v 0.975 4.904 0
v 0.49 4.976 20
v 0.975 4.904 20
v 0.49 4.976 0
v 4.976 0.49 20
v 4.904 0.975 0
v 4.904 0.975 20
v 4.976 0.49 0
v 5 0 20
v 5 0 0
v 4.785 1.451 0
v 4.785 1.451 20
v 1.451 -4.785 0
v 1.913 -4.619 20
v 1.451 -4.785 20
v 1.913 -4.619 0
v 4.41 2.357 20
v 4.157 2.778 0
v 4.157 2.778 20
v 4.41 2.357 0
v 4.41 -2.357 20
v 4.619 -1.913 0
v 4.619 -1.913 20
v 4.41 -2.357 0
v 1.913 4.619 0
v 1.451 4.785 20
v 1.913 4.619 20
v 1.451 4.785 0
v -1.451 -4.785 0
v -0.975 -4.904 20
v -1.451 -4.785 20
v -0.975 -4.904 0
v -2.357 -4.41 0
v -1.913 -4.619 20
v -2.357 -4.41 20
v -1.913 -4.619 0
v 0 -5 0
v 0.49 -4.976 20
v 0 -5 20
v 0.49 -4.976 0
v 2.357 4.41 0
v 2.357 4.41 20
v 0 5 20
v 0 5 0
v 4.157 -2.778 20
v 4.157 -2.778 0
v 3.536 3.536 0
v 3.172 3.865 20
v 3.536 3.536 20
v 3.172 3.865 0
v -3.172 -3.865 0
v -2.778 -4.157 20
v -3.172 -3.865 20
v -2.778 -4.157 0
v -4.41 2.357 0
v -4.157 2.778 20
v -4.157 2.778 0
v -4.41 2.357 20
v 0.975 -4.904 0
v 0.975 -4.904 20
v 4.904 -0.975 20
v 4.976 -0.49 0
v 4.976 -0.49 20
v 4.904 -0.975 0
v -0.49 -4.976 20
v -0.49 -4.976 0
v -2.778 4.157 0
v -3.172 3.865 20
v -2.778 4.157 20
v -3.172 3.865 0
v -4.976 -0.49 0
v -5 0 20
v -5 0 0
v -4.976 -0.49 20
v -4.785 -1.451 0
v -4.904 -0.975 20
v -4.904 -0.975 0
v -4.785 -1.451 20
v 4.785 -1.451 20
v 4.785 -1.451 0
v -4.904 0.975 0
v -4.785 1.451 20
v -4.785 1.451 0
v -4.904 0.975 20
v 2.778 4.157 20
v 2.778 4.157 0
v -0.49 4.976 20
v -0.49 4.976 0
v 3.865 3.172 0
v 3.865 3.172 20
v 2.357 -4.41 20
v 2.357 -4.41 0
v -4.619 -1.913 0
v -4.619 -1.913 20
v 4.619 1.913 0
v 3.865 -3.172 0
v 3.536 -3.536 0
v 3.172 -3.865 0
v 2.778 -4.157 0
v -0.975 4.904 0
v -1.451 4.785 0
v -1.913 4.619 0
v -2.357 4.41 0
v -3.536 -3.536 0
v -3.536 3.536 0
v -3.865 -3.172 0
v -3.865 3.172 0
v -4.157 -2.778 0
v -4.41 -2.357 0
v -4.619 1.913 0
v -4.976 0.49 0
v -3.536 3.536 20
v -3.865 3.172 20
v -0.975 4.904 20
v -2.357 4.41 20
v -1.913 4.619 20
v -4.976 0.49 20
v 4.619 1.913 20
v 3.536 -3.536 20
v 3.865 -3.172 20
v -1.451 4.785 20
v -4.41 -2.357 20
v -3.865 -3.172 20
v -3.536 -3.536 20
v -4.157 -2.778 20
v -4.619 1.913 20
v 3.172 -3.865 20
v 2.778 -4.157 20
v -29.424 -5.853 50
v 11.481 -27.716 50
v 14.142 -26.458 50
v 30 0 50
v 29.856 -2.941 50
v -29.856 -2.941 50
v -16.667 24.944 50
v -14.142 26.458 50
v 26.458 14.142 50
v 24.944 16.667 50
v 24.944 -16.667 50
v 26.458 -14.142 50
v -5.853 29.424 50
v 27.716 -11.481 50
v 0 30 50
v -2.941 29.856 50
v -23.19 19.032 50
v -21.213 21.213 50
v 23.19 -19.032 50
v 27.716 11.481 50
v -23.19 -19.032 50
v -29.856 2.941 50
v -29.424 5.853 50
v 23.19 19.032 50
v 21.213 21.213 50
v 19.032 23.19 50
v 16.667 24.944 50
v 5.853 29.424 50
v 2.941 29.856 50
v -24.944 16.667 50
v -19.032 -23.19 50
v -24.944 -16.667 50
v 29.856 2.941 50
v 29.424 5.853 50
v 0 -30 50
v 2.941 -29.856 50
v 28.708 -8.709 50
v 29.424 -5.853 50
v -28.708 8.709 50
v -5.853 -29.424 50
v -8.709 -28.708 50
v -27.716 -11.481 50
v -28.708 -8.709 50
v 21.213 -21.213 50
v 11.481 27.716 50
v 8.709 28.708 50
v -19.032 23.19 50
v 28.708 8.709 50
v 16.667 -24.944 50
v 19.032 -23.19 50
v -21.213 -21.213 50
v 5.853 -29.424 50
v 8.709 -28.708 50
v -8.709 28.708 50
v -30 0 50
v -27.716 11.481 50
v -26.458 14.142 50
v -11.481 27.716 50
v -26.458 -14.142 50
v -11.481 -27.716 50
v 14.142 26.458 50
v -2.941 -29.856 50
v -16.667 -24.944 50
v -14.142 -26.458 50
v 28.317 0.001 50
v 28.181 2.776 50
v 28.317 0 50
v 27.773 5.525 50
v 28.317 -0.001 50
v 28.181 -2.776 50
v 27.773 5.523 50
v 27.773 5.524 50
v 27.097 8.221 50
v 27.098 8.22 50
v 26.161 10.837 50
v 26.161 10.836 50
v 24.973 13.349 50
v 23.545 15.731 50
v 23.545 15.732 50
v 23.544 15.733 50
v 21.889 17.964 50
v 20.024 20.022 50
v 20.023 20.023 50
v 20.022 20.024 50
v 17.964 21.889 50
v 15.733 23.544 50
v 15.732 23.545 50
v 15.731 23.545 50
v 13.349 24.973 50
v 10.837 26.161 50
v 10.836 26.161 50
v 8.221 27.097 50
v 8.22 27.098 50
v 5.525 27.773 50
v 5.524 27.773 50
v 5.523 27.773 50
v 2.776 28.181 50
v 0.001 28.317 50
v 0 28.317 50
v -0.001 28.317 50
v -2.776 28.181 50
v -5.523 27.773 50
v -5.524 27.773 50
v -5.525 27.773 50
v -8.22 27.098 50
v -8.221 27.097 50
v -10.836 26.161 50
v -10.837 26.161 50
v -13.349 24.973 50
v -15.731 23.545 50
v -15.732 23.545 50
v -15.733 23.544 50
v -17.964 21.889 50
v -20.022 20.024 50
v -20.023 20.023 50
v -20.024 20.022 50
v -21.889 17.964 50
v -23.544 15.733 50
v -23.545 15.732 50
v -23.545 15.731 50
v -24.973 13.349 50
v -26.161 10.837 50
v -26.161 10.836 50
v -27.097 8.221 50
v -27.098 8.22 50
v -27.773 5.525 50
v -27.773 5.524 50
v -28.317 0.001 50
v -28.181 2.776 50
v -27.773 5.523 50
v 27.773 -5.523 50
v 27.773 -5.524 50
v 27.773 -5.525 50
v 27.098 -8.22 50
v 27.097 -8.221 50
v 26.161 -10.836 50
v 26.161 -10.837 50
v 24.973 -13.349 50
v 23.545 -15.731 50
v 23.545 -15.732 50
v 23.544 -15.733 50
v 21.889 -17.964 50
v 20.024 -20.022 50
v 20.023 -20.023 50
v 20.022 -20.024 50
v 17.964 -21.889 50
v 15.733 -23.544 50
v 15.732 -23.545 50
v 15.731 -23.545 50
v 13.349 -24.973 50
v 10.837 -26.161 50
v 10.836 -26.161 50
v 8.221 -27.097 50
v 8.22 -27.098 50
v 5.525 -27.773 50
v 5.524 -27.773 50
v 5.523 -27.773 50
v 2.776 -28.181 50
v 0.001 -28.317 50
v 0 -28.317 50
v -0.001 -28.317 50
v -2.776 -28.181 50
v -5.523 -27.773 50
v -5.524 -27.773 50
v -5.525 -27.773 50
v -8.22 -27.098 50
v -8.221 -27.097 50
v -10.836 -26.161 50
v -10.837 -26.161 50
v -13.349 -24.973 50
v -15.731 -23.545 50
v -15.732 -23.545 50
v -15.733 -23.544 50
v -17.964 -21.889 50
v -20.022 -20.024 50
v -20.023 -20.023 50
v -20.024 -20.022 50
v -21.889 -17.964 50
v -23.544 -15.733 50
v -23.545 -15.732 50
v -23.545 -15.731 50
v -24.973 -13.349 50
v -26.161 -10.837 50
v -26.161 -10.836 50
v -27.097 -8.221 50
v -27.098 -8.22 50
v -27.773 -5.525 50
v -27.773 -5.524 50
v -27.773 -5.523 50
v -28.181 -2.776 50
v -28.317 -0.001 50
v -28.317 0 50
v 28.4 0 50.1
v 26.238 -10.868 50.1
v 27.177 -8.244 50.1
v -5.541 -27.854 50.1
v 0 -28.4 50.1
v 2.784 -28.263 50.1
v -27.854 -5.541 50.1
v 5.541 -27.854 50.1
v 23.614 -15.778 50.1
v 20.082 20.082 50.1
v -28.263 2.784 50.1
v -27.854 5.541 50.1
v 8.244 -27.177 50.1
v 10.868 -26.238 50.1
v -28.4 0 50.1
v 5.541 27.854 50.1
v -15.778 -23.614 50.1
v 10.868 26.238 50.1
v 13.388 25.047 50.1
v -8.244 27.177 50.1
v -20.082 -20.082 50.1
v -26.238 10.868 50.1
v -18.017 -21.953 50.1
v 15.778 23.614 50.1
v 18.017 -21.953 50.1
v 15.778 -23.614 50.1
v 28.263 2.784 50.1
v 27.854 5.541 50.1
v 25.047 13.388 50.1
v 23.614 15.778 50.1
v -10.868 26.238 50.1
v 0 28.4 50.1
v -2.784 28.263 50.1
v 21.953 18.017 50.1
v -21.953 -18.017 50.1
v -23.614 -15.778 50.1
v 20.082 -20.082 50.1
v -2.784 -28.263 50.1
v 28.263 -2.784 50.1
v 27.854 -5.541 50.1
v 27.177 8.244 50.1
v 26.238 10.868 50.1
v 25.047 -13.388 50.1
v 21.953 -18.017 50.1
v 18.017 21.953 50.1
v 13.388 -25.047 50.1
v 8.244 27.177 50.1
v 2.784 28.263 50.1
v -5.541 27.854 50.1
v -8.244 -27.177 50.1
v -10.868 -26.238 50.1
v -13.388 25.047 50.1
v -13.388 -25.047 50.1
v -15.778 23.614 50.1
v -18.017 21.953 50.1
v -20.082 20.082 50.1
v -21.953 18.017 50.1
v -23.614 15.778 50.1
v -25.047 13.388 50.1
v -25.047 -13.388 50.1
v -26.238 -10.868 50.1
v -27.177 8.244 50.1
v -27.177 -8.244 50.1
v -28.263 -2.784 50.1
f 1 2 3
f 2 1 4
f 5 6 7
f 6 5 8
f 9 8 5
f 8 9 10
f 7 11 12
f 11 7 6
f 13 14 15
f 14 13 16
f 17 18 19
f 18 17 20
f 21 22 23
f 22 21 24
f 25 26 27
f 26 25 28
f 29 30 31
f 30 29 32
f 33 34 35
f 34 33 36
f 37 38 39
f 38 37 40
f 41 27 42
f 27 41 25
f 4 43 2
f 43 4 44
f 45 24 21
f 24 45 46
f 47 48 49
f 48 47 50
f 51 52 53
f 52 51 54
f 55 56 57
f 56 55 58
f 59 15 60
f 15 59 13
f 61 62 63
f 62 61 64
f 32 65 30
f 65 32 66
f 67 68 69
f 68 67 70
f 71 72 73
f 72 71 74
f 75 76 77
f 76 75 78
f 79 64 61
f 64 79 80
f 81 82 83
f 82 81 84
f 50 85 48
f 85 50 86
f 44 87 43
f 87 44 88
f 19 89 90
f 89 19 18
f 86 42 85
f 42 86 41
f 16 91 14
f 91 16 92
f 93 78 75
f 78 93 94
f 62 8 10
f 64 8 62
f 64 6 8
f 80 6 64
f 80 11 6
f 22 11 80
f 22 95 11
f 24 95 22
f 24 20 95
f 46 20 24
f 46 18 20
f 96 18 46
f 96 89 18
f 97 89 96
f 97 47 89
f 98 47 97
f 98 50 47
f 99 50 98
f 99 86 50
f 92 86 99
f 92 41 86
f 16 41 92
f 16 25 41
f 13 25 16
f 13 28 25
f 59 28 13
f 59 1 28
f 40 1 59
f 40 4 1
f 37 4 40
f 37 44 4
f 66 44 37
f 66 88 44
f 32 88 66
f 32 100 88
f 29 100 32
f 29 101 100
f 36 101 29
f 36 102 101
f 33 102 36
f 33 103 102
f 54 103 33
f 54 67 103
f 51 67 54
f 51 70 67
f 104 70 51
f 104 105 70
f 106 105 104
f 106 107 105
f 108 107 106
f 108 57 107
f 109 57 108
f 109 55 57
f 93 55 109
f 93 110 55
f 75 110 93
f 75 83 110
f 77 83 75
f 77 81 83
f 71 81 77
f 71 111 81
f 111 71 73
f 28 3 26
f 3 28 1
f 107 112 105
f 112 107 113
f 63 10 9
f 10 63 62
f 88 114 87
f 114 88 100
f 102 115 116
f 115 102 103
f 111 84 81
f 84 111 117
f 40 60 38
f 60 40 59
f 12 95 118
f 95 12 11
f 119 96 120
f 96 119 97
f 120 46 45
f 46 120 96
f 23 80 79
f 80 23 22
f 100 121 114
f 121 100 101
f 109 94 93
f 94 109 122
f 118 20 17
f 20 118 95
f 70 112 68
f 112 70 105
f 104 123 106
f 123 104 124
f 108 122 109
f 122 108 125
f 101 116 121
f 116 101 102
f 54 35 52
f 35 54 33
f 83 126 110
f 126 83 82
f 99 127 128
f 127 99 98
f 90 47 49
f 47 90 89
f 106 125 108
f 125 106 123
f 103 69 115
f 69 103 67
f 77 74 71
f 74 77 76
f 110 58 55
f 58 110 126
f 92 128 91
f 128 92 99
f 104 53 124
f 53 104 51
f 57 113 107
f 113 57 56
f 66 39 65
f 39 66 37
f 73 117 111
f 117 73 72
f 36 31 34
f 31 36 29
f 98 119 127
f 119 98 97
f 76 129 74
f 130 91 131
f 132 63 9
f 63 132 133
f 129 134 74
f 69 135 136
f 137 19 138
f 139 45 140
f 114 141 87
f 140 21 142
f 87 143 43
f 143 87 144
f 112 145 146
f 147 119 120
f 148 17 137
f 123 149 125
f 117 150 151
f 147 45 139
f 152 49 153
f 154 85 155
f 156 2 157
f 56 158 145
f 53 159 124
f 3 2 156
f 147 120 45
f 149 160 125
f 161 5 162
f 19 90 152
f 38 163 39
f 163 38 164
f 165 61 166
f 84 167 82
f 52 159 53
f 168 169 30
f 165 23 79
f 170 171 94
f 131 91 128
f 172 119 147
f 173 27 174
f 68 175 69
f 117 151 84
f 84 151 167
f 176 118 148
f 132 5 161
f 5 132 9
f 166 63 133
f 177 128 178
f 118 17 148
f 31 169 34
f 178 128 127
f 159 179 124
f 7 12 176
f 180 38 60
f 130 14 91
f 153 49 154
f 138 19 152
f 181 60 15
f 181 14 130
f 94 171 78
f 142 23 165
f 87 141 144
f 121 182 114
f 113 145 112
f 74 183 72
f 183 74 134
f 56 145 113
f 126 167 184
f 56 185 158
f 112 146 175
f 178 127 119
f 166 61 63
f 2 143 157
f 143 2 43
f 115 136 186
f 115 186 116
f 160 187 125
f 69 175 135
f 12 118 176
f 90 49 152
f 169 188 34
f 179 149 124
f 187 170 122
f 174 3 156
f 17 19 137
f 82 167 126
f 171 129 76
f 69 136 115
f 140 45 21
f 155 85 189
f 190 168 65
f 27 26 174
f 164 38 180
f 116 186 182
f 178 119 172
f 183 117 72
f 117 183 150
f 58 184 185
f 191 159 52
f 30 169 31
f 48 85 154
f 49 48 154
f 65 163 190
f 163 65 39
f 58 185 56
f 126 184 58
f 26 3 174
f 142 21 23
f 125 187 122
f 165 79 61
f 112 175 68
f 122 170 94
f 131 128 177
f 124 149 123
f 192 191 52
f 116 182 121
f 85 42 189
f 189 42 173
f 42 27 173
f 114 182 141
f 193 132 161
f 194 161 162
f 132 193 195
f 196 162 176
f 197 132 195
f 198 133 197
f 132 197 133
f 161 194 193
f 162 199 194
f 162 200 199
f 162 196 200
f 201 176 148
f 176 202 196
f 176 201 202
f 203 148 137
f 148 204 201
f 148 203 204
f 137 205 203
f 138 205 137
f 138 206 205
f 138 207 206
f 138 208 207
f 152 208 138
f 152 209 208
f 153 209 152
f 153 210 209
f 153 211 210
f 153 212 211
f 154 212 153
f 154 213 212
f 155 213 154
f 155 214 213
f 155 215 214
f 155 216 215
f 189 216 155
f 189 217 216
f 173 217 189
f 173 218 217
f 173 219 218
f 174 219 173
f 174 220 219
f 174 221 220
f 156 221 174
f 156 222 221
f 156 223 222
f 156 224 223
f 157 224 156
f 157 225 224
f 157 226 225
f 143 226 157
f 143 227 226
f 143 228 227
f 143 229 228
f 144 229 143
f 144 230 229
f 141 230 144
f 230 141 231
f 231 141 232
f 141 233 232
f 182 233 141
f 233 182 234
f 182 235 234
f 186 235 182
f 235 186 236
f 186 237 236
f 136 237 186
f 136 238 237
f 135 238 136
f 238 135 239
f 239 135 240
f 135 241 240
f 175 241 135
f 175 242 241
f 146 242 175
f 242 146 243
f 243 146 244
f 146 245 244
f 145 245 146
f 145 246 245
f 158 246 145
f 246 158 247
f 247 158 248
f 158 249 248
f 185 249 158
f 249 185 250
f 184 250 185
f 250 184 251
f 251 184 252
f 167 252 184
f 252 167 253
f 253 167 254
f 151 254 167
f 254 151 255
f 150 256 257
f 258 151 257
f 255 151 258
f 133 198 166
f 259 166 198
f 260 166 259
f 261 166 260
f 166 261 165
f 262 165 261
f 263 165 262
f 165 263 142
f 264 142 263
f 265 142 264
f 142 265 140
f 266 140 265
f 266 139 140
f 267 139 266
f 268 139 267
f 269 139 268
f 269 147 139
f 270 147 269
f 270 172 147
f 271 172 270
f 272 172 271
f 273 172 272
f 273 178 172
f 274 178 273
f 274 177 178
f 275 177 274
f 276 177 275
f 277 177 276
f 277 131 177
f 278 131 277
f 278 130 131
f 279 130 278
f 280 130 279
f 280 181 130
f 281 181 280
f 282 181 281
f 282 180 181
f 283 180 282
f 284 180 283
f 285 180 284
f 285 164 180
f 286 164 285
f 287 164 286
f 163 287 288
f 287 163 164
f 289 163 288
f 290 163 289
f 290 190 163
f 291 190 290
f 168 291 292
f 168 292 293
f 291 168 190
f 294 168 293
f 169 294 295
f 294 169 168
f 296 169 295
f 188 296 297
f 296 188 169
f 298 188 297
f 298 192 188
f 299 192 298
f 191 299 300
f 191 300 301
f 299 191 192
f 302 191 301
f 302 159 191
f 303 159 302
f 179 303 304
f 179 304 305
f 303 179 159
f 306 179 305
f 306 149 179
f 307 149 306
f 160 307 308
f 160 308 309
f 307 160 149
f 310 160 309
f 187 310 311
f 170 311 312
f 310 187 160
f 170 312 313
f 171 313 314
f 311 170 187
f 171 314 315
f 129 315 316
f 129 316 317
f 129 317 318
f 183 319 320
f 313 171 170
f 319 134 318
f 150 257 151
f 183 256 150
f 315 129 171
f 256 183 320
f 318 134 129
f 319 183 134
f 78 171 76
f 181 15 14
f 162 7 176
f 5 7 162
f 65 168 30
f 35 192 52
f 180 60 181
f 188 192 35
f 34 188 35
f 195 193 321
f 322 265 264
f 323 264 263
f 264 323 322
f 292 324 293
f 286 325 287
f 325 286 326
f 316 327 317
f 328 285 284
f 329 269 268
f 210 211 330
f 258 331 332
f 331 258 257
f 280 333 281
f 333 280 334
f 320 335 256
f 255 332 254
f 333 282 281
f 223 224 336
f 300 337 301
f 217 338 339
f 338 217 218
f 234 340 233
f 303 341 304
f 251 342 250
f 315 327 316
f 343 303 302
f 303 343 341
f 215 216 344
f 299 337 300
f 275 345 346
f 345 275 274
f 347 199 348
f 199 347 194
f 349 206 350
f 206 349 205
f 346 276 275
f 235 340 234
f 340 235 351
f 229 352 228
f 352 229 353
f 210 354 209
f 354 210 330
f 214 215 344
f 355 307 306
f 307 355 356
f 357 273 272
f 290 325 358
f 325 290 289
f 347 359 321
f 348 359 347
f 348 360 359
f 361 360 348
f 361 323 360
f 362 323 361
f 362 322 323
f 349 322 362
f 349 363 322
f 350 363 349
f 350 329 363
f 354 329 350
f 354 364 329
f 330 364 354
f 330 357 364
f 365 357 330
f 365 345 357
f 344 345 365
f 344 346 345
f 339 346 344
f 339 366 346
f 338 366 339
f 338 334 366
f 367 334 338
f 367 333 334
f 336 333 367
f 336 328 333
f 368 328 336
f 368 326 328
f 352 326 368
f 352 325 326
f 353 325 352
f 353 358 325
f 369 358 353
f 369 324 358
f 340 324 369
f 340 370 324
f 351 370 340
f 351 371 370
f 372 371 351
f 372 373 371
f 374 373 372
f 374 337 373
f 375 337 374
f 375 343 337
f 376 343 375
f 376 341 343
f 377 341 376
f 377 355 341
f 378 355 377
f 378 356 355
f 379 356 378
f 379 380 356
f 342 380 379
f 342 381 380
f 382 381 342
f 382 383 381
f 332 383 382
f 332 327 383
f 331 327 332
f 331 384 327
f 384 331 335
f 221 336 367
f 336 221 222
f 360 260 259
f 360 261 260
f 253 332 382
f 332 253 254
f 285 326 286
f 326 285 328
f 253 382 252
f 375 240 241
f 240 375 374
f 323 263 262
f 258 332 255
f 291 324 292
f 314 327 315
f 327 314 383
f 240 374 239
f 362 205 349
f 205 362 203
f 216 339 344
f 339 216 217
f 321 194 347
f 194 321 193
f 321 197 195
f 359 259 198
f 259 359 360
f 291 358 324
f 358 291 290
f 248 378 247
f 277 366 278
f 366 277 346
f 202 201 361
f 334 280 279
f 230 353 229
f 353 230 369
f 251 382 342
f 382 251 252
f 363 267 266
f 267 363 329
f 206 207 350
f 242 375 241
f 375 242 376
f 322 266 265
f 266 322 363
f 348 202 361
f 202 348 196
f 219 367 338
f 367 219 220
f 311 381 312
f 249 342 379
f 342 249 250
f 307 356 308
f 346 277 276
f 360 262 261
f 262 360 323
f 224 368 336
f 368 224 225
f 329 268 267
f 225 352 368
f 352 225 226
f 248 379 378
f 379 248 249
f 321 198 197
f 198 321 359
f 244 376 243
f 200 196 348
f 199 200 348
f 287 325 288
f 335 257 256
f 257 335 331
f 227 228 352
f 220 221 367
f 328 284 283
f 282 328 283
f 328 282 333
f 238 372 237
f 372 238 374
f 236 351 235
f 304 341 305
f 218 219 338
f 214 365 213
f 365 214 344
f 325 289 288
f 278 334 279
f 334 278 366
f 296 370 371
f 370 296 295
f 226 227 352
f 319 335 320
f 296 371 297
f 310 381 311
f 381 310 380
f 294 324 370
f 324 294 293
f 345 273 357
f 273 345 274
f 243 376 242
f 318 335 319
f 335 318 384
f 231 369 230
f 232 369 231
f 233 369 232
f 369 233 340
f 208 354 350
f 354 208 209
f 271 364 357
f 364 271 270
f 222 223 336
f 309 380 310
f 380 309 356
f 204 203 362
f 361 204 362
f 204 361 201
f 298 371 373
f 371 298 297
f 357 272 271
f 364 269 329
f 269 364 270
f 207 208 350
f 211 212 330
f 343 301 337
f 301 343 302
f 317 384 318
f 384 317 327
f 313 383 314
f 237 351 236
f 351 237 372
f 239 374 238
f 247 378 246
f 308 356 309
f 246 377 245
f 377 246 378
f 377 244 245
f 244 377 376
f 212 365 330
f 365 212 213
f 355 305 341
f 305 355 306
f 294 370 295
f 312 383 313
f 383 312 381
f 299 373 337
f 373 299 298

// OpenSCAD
// --- Dimensions (mm) ---
spout_od = 10.0;          // Outer diameter of the spout
spout_height = 20.0;      // Height of the spout from the base
funnel_rim_od = 60.0;     // Outer diameter at the top rim
funnel_height = 50.0;     // Total height from base to top rim
wall_thickness = 1.6;     // Constant wall thickness
$fn = 64;                 // Smoothness for curves

// --- Derived Dimensions ---
spout_id = spout_od - (2 * wall_thickness);
funnel_id_base = spout_od - (2 * wall_thickness); // ID at the junction (z=20)
funnel_id_top = funnel_rim_od - (2 * wall_thickness);

// --- Modeling ---

// The part is printed upright, resting on the XY plane at z = 0.
// We use a union of the spout and the cone, then subtract the hollow interior.

union() {
    // 1. The Spout (Cylinder)
    cylinder(h = spout_height, d = spout_od);

    // 2. The Funnel Cone
    translate([0, 0, spout_height])
    cylinder(h = funnel_height - spout_height, d1 = spout_od, d2 = funnel_rim_od);
}

// 3. The Hollow Interior (Subtraction)
difference() {
    // We use a large enough object to ensure clean cuts
    // We subtract the interior space from the solid body above
    union() {
        // Interior Spout
        cylinder(h = spout_height + 0.1, d = spout_id);
        
        // Interior Cone
        translate([0, 0, spout_height])
        cylinder(h = (funnel_height - spout_height) + 0.1, d1 = spout_id, d2 = funnel_id_top);
    }
}

// Note: The logic above is slightly flawed for a single difference() block. 
// Let's rewrite the structure to be mathematically sound for OpenSCAD.

/* 
REWRITTEN STRUCTURE:
Total Solid = (Spout + Cone)
Final Part = Total Solid MINUS (Spout_Hole + Cone_Hole)
*/

// Clear the previous logic and use this clean implementation:

module funnel_solid() {
    // The outer shell
    union() {
        // Spout
        cylinder(h = spout_height, d = spout_od);
        // Cone
        translate([0, 0, spout_height])
        cylinder(h = funnel_height - spout_height, d1 = spout_od, d2 = funnel_rim_od);
    }
}

module funnel_hollow() {
    // The inner void
    union() {
        // Spout hole
        cylinder(h = spout_height + 1, d = spout_id);
        // Cone hole
        translate([0, 0, spout_height - 0.1])
        cylinder(h = (funnel_height - spout_height) + 1.1, d1 = spout_id, d2 = funnel_id_top);
    }
}

// Final Assembly
difference() {
    funnel_solid();
    funnel_hollow();
}
